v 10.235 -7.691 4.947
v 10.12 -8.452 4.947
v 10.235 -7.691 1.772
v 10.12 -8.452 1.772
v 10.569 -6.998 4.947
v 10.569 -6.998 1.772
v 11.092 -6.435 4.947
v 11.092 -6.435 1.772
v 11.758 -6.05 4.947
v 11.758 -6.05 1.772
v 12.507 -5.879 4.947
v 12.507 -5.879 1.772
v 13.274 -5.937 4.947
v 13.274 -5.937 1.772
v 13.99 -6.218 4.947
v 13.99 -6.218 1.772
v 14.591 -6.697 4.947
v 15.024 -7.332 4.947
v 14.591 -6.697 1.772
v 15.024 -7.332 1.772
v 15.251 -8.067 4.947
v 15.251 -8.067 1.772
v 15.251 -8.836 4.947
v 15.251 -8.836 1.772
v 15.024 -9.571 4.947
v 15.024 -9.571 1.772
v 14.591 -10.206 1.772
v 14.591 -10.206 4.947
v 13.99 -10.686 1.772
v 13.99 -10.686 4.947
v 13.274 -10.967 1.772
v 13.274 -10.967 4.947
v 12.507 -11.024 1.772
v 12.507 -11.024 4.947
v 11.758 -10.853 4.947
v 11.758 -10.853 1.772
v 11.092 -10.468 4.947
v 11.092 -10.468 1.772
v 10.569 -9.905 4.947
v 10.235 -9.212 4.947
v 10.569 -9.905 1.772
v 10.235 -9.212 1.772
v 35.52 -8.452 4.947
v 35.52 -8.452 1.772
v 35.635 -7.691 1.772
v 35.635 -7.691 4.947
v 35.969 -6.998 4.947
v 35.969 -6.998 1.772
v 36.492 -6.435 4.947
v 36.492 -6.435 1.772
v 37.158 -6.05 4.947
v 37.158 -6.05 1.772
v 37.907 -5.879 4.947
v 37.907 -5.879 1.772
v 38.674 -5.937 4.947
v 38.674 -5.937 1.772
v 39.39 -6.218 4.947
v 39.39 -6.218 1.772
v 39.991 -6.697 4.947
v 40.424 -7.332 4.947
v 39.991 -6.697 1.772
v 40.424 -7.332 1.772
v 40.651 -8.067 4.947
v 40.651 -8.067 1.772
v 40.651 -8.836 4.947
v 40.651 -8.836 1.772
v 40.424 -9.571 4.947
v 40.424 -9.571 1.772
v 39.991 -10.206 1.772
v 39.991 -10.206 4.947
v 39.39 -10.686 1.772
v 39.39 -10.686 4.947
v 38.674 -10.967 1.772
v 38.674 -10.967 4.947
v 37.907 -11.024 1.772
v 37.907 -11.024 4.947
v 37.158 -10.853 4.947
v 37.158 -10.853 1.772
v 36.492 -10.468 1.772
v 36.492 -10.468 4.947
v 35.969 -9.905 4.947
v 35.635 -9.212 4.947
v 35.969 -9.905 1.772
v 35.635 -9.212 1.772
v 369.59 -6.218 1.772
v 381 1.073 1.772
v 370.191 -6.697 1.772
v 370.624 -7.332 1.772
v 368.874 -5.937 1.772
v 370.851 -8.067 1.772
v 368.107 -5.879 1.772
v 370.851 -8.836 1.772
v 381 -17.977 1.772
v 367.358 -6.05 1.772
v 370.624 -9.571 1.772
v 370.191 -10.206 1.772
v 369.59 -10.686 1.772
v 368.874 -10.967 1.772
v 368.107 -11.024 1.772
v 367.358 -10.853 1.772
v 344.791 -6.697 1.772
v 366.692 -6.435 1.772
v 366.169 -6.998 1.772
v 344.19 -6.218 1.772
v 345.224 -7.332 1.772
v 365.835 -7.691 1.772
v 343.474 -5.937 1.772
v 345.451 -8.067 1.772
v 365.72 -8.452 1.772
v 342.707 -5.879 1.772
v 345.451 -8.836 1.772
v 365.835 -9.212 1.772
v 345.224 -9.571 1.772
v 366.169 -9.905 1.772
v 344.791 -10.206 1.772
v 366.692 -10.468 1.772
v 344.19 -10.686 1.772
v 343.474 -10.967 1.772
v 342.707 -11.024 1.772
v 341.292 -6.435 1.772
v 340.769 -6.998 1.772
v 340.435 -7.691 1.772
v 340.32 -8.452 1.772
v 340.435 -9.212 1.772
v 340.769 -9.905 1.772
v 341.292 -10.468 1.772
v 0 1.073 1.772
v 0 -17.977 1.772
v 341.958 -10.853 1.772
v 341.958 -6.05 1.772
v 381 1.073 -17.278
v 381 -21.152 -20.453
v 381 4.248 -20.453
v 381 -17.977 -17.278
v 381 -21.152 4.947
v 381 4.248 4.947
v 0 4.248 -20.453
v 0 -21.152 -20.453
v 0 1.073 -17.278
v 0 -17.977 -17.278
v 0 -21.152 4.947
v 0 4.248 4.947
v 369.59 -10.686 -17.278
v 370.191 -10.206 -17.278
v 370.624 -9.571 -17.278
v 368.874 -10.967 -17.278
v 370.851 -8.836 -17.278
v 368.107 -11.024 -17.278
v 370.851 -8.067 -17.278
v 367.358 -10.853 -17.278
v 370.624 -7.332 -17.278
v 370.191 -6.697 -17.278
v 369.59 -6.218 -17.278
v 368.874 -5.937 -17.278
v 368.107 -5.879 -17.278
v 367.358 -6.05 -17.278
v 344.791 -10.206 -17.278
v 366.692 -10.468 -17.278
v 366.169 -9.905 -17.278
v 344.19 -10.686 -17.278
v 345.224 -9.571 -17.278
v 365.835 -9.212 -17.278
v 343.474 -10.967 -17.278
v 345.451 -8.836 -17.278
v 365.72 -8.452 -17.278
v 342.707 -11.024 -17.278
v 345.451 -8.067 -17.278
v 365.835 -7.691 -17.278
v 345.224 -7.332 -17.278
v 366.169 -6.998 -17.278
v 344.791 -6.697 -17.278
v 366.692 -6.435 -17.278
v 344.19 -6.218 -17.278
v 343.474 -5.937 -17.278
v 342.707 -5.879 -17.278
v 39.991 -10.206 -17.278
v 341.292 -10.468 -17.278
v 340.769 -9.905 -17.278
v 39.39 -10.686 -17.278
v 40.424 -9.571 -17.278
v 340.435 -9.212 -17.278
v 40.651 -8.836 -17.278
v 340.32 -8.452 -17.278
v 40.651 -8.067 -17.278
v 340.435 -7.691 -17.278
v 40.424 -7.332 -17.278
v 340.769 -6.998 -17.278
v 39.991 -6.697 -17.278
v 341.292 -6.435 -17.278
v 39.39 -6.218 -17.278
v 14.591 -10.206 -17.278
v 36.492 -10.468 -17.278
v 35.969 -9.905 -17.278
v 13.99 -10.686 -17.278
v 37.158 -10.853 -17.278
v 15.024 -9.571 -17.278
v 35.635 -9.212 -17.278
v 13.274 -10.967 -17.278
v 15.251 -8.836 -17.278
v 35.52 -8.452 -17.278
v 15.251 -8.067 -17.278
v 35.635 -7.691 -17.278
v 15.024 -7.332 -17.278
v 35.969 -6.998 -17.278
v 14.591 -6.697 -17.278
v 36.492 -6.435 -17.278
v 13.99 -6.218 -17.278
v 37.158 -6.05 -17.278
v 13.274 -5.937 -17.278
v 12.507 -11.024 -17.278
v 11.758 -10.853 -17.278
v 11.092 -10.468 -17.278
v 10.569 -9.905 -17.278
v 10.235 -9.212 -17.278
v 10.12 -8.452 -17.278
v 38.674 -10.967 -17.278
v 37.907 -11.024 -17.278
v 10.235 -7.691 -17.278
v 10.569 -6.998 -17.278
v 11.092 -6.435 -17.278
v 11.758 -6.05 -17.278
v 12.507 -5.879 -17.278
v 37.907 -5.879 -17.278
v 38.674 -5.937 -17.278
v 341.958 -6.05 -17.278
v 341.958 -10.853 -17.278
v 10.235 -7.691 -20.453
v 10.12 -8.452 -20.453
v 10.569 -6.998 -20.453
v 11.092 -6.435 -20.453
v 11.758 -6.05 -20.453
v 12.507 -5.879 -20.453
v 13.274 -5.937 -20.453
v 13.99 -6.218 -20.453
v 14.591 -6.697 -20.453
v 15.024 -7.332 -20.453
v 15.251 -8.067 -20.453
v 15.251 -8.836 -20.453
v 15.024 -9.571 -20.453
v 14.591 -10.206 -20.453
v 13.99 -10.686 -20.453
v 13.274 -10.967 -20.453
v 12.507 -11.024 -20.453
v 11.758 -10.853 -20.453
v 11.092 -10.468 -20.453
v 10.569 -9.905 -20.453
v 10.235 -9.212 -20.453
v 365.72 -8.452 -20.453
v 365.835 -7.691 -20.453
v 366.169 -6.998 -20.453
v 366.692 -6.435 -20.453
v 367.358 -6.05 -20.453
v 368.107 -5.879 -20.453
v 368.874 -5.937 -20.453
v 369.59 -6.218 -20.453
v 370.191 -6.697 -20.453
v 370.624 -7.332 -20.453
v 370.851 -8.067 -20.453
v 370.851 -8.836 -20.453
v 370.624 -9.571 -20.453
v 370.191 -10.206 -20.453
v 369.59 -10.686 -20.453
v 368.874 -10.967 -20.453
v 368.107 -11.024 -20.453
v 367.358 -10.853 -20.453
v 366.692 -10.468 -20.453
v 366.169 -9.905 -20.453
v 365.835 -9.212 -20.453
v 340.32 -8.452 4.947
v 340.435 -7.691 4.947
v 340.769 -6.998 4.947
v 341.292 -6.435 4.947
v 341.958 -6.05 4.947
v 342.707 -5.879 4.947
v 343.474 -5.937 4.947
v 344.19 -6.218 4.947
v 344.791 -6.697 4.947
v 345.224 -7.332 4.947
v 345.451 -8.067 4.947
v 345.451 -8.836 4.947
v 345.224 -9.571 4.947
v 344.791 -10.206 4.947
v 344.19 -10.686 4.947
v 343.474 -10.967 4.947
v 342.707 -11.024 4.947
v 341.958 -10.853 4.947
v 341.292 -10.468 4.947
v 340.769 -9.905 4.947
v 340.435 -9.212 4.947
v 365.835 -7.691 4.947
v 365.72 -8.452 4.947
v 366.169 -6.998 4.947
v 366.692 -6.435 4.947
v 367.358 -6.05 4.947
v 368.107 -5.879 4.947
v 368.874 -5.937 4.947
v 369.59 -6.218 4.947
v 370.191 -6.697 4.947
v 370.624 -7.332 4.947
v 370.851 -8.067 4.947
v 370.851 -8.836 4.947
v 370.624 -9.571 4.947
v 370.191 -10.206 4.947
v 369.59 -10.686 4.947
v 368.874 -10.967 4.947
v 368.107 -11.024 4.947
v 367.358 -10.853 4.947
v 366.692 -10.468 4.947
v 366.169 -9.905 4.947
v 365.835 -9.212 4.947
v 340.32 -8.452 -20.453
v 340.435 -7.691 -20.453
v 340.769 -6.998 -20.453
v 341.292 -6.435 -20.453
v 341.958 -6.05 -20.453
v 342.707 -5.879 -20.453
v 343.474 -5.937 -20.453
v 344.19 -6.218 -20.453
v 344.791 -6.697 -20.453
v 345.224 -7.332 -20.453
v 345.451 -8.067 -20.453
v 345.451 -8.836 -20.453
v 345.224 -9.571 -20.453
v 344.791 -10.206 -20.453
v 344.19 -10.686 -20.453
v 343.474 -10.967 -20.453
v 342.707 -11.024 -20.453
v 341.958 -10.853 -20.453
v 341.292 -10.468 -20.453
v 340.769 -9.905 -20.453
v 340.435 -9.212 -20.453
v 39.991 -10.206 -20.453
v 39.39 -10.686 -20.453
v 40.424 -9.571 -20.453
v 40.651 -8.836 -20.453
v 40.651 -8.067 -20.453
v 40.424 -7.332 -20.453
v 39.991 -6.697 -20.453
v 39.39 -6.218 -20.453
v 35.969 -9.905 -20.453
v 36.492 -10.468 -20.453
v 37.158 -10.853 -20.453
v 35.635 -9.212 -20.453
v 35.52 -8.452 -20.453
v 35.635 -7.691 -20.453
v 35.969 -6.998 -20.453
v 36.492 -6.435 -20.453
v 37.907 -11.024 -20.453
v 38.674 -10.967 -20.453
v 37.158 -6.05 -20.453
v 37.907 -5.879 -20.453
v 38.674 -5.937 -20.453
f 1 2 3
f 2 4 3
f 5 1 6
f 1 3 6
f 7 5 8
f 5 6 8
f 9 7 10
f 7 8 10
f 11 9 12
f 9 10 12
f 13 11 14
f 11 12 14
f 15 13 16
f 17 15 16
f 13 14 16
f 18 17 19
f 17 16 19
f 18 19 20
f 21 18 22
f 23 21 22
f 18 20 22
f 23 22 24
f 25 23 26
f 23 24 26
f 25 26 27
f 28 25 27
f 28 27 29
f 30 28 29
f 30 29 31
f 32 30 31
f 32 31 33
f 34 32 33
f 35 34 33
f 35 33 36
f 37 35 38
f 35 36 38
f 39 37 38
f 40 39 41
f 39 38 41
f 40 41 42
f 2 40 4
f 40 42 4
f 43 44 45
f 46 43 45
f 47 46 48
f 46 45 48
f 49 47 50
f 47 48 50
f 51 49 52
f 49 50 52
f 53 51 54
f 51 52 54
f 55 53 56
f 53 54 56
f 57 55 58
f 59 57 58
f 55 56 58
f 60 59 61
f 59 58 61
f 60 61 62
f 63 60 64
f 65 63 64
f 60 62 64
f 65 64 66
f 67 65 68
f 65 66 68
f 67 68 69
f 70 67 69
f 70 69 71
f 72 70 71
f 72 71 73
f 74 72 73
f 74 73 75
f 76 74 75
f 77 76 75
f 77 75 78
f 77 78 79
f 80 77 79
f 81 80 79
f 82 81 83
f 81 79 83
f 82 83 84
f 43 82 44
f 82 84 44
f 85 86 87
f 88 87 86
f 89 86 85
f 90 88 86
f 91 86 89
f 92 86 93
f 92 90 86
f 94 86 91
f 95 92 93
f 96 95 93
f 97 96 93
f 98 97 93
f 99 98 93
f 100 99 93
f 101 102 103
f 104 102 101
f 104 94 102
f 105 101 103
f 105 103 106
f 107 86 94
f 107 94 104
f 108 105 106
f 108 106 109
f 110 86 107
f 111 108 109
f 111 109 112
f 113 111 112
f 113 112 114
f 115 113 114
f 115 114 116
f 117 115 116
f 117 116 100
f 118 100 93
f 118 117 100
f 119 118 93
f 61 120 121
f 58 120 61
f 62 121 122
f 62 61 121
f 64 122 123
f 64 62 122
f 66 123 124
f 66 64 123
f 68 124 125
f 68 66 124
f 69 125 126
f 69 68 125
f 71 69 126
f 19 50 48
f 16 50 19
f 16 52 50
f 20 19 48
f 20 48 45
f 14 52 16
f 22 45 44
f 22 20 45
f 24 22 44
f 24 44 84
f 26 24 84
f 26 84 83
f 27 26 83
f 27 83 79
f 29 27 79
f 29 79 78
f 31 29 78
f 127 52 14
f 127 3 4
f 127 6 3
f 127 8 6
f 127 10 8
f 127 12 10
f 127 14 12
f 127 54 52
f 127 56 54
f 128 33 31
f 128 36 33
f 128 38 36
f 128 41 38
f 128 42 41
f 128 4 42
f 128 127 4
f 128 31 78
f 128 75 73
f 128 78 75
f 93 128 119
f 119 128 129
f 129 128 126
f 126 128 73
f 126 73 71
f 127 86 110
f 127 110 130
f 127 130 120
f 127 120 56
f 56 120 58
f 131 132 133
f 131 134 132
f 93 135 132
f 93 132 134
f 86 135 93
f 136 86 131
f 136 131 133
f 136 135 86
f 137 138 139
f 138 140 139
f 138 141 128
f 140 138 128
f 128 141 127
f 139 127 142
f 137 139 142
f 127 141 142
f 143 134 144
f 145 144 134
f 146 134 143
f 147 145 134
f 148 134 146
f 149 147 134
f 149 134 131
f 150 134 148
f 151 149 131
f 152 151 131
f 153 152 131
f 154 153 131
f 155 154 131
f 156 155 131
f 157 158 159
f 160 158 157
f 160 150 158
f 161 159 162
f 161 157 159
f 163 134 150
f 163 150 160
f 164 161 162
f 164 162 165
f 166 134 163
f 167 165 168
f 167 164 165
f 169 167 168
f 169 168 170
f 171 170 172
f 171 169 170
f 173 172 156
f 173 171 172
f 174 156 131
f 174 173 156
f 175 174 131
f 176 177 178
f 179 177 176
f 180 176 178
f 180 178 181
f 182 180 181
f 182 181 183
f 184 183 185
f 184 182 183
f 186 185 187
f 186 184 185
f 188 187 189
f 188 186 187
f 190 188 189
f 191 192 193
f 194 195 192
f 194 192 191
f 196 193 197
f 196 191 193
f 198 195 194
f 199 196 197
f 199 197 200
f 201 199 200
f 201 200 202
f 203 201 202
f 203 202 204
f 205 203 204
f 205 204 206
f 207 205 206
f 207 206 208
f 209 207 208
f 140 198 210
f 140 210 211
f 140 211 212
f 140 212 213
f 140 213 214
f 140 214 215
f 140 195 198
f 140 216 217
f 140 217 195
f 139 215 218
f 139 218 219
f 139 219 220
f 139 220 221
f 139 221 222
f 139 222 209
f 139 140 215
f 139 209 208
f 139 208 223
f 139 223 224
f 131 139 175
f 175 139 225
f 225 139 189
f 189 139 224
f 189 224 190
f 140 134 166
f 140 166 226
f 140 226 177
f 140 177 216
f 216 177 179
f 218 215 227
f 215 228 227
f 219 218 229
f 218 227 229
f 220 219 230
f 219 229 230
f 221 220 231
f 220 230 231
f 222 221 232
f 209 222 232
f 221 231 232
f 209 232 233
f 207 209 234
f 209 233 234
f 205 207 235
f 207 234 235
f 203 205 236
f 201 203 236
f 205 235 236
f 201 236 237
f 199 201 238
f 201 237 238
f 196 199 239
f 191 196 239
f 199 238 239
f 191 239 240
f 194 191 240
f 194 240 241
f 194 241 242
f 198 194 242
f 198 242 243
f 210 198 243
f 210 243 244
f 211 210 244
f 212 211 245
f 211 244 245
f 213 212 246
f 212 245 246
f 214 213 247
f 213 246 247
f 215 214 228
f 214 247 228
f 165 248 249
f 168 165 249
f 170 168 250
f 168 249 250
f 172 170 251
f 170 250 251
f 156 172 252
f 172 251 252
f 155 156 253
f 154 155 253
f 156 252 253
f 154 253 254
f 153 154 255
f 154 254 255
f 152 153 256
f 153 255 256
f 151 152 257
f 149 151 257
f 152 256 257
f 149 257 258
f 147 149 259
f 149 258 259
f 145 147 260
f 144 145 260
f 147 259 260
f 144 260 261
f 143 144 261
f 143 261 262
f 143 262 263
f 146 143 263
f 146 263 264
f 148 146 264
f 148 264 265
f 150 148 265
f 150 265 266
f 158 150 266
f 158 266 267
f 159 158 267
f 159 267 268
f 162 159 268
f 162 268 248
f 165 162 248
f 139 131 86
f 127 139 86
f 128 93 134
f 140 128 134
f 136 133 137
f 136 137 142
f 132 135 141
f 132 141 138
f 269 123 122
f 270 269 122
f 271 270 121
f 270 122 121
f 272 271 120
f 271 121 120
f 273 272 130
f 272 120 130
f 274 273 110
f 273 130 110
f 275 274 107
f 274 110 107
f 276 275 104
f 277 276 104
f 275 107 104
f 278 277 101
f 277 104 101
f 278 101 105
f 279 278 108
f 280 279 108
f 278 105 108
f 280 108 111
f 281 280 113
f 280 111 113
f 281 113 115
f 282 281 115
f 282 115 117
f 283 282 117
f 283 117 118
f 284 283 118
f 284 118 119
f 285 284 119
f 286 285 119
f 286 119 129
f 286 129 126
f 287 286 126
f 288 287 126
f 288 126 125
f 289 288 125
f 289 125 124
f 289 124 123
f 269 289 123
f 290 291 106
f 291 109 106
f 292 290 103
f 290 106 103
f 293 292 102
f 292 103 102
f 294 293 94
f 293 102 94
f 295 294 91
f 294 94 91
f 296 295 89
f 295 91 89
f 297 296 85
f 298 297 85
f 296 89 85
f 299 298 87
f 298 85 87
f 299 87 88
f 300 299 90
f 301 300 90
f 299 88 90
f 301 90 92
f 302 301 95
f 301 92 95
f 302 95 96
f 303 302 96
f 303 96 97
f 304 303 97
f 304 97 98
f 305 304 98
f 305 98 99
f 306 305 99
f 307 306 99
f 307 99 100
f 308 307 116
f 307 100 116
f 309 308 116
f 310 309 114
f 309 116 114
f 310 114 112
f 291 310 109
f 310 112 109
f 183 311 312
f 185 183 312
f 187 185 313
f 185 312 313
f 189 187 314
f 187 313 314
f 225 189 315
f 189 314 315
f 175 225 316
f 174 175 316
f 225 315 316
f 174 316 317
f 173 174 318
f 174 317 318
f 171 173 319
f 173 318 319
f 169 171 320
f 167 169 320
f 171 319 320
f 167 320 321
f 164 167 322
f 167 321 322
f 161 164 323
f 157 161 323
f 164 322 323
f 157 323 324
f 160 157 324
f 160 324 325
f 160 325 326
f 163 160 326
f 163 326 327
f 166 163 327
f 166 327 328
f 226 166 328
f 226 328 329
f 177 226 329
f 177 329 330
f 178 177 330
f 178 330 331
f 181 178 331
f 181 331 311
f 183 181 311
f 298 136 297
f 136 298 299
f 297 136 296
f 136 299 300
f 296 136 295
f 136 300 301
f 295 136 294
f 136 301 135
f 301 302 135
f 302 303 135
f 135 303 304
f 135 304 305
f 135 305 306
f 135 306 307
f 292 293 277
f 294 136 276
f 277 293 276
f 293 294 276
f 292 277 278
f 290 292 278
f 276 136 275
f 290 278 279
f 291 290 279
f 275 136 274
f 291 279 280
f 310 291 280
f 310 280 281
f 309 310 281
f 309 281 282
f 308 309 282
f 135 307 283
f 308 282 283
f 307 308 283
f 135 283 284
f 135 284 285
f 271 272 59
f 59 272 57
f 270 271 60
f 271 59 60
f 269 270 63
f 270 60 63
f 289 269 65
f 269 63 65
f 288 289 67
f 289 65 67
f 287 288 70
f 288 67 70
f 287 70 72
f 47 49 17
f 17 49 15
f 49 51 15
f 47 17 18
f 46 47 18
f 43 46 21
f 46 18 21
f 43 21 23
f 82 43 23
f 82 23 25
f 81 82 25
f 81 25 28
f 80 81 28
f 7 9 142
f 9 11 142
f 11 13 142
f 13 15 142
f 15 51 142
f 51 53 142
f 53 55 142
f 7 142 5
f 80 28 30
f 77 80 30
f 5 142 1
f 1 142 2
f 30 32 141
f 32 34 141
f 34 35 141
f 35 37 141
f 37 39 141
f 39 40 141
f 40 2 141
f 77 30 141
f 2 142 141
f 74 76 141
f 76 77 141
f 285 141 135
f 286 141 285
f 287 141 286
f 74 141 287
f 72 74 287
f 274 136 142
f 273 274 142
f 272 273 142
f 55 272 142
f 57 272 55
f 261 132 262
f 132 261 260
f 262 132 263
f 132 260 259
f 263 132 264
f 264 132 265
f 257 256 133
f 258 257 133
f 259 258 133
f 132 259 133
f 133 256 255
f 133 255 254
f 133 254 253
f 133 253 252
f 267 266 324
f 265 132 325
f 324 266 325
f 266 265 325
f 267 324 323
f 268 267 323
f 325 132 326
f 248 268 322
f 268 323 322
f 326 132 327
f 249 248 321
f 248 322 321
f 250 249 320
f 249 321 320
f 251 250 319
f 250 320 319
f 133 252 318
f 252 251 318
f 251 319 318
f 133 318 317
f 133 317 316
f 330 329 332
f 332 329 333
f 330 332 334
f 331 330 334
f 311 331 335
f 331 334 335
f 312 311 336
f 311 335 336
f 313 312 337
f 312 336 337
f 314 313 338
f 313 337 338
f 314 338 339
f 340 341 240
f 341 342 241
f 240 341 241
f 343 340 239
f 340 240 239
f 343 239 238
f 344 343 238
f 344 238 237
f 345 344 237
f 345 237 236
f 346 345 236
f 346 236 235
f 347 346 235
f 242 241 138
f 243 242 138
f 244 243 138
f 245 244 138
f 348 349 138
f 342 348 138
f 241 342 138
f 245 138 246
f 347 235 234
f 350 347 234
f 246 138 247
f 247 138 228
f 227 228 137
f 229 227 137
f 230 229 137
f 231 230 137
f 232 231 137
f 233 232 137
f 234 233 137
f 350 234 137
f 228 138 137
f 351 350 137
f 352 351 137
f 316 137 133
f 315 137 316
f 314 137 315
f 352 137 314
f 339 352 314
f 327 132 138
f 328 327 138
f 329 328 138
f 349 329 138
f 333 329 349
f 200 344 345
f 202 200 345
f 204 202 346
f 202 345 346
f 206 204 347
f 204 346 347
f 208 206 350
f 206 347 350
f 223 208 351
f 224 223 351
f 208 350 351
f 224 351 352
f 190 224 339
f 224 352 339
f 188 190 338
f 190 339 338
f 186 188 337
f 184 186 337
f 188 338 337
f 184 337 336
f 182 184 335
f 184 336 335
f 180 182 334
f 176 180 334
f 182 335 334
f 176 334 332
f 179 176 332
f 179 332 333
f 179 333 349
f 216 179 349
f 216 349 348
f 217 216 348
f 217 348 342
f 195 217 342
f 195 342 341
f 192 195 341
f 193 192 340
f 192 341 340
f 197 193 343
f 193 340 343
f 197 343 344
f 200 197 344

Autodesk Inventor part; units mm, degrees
ref_plane "YZ Plane" through (0, 0, 0) normal (1, 0, 0) x (0, 1, 0)
ref_plane "XZ Plane" through (0, 0, 0) normal (0, 1, 0) x (-1, 0, 0)
ref_plane "XY Plane" through (0, 0, 0) normal (0, 0, 1) x (1, 0, 0)
sketch "Sketch1" plane through (0, 0, 0) normal (1, 0, 0) x (0, 1, 0)
  line L0 (4.2484, 4.9473) -> (-21.1516, 4.9473)
  line L1 (-21.1516, 4.9473) -> (-21.1516, -20.4527)
  line L2 (-21.1516, -20.4527) -> (4.2484, -20.4527)
  line L3 (4.2484, -20.4527) -> (4.2484, 4.9473)
  line L4 (1.0734, 1.7723) -> (-17.9766, 1.7723)
  line L5 (-17.9766, 1.7723) -> (-17.9766, -17.2777)
  line L6 (-17.9766, -17.2777) -> (1.0734, -17.2777)
  line L7 (1.0734, -17.2777) -> (1.0734, 1.7723)
  point P0 (0, 0)
  dimension "d0" = 25.4
  dimension "d1" = 25.4
  dimension "d2" = 3.175
extrude "Extrusion1" add sketch "Sketch1" along normal blind 381
sketch "Sketch2" plane through (0, -21.1516, -20.4527) normal (0, 0, -1) x (-1, 0, 0)
  line L0 (0, 0) -> (0, 25.4) construction
  line L1 (0, 12.7) -> (-12.7, 12.7) construction
  line L2 (-12.7, 12.7) -> (-38.1, 12.7) construction
  line L3 (-381, 0) -> (-381, 25.4) construction
  line L4 (-381, 12.7) -> (-368.3, 12.7) construction
  line L5 (-368.3, 12.7) -> (-342.9, 12.7) construction
  circle A0 centre (-368.3, 12.7) radius 2.5797
  circle A1 centre (-342.9, 12.7) radius 2.5797
  circle A2 centre (-12.7, 12.7) radius 2.5797
  circle A3 centre (-38.1, 12.7) radius 2.5797
  point P0 (0, 21.1516)
  dimension "d5" = 12.7
  dimension "d6" = 25.4
  dimension "d7" = 12.7
  dimension "d8" = 25.4
  dimension "d9" = 5.1594
  dimension "d10" = 5.1594
  dimension "d11" = 5.1594
  dimension "d12" = 5.1594
extrude "Extrusion2" cut sketch "Sketch2" against normal blind 431.8
properties part number "17in 1x1 Beam"
